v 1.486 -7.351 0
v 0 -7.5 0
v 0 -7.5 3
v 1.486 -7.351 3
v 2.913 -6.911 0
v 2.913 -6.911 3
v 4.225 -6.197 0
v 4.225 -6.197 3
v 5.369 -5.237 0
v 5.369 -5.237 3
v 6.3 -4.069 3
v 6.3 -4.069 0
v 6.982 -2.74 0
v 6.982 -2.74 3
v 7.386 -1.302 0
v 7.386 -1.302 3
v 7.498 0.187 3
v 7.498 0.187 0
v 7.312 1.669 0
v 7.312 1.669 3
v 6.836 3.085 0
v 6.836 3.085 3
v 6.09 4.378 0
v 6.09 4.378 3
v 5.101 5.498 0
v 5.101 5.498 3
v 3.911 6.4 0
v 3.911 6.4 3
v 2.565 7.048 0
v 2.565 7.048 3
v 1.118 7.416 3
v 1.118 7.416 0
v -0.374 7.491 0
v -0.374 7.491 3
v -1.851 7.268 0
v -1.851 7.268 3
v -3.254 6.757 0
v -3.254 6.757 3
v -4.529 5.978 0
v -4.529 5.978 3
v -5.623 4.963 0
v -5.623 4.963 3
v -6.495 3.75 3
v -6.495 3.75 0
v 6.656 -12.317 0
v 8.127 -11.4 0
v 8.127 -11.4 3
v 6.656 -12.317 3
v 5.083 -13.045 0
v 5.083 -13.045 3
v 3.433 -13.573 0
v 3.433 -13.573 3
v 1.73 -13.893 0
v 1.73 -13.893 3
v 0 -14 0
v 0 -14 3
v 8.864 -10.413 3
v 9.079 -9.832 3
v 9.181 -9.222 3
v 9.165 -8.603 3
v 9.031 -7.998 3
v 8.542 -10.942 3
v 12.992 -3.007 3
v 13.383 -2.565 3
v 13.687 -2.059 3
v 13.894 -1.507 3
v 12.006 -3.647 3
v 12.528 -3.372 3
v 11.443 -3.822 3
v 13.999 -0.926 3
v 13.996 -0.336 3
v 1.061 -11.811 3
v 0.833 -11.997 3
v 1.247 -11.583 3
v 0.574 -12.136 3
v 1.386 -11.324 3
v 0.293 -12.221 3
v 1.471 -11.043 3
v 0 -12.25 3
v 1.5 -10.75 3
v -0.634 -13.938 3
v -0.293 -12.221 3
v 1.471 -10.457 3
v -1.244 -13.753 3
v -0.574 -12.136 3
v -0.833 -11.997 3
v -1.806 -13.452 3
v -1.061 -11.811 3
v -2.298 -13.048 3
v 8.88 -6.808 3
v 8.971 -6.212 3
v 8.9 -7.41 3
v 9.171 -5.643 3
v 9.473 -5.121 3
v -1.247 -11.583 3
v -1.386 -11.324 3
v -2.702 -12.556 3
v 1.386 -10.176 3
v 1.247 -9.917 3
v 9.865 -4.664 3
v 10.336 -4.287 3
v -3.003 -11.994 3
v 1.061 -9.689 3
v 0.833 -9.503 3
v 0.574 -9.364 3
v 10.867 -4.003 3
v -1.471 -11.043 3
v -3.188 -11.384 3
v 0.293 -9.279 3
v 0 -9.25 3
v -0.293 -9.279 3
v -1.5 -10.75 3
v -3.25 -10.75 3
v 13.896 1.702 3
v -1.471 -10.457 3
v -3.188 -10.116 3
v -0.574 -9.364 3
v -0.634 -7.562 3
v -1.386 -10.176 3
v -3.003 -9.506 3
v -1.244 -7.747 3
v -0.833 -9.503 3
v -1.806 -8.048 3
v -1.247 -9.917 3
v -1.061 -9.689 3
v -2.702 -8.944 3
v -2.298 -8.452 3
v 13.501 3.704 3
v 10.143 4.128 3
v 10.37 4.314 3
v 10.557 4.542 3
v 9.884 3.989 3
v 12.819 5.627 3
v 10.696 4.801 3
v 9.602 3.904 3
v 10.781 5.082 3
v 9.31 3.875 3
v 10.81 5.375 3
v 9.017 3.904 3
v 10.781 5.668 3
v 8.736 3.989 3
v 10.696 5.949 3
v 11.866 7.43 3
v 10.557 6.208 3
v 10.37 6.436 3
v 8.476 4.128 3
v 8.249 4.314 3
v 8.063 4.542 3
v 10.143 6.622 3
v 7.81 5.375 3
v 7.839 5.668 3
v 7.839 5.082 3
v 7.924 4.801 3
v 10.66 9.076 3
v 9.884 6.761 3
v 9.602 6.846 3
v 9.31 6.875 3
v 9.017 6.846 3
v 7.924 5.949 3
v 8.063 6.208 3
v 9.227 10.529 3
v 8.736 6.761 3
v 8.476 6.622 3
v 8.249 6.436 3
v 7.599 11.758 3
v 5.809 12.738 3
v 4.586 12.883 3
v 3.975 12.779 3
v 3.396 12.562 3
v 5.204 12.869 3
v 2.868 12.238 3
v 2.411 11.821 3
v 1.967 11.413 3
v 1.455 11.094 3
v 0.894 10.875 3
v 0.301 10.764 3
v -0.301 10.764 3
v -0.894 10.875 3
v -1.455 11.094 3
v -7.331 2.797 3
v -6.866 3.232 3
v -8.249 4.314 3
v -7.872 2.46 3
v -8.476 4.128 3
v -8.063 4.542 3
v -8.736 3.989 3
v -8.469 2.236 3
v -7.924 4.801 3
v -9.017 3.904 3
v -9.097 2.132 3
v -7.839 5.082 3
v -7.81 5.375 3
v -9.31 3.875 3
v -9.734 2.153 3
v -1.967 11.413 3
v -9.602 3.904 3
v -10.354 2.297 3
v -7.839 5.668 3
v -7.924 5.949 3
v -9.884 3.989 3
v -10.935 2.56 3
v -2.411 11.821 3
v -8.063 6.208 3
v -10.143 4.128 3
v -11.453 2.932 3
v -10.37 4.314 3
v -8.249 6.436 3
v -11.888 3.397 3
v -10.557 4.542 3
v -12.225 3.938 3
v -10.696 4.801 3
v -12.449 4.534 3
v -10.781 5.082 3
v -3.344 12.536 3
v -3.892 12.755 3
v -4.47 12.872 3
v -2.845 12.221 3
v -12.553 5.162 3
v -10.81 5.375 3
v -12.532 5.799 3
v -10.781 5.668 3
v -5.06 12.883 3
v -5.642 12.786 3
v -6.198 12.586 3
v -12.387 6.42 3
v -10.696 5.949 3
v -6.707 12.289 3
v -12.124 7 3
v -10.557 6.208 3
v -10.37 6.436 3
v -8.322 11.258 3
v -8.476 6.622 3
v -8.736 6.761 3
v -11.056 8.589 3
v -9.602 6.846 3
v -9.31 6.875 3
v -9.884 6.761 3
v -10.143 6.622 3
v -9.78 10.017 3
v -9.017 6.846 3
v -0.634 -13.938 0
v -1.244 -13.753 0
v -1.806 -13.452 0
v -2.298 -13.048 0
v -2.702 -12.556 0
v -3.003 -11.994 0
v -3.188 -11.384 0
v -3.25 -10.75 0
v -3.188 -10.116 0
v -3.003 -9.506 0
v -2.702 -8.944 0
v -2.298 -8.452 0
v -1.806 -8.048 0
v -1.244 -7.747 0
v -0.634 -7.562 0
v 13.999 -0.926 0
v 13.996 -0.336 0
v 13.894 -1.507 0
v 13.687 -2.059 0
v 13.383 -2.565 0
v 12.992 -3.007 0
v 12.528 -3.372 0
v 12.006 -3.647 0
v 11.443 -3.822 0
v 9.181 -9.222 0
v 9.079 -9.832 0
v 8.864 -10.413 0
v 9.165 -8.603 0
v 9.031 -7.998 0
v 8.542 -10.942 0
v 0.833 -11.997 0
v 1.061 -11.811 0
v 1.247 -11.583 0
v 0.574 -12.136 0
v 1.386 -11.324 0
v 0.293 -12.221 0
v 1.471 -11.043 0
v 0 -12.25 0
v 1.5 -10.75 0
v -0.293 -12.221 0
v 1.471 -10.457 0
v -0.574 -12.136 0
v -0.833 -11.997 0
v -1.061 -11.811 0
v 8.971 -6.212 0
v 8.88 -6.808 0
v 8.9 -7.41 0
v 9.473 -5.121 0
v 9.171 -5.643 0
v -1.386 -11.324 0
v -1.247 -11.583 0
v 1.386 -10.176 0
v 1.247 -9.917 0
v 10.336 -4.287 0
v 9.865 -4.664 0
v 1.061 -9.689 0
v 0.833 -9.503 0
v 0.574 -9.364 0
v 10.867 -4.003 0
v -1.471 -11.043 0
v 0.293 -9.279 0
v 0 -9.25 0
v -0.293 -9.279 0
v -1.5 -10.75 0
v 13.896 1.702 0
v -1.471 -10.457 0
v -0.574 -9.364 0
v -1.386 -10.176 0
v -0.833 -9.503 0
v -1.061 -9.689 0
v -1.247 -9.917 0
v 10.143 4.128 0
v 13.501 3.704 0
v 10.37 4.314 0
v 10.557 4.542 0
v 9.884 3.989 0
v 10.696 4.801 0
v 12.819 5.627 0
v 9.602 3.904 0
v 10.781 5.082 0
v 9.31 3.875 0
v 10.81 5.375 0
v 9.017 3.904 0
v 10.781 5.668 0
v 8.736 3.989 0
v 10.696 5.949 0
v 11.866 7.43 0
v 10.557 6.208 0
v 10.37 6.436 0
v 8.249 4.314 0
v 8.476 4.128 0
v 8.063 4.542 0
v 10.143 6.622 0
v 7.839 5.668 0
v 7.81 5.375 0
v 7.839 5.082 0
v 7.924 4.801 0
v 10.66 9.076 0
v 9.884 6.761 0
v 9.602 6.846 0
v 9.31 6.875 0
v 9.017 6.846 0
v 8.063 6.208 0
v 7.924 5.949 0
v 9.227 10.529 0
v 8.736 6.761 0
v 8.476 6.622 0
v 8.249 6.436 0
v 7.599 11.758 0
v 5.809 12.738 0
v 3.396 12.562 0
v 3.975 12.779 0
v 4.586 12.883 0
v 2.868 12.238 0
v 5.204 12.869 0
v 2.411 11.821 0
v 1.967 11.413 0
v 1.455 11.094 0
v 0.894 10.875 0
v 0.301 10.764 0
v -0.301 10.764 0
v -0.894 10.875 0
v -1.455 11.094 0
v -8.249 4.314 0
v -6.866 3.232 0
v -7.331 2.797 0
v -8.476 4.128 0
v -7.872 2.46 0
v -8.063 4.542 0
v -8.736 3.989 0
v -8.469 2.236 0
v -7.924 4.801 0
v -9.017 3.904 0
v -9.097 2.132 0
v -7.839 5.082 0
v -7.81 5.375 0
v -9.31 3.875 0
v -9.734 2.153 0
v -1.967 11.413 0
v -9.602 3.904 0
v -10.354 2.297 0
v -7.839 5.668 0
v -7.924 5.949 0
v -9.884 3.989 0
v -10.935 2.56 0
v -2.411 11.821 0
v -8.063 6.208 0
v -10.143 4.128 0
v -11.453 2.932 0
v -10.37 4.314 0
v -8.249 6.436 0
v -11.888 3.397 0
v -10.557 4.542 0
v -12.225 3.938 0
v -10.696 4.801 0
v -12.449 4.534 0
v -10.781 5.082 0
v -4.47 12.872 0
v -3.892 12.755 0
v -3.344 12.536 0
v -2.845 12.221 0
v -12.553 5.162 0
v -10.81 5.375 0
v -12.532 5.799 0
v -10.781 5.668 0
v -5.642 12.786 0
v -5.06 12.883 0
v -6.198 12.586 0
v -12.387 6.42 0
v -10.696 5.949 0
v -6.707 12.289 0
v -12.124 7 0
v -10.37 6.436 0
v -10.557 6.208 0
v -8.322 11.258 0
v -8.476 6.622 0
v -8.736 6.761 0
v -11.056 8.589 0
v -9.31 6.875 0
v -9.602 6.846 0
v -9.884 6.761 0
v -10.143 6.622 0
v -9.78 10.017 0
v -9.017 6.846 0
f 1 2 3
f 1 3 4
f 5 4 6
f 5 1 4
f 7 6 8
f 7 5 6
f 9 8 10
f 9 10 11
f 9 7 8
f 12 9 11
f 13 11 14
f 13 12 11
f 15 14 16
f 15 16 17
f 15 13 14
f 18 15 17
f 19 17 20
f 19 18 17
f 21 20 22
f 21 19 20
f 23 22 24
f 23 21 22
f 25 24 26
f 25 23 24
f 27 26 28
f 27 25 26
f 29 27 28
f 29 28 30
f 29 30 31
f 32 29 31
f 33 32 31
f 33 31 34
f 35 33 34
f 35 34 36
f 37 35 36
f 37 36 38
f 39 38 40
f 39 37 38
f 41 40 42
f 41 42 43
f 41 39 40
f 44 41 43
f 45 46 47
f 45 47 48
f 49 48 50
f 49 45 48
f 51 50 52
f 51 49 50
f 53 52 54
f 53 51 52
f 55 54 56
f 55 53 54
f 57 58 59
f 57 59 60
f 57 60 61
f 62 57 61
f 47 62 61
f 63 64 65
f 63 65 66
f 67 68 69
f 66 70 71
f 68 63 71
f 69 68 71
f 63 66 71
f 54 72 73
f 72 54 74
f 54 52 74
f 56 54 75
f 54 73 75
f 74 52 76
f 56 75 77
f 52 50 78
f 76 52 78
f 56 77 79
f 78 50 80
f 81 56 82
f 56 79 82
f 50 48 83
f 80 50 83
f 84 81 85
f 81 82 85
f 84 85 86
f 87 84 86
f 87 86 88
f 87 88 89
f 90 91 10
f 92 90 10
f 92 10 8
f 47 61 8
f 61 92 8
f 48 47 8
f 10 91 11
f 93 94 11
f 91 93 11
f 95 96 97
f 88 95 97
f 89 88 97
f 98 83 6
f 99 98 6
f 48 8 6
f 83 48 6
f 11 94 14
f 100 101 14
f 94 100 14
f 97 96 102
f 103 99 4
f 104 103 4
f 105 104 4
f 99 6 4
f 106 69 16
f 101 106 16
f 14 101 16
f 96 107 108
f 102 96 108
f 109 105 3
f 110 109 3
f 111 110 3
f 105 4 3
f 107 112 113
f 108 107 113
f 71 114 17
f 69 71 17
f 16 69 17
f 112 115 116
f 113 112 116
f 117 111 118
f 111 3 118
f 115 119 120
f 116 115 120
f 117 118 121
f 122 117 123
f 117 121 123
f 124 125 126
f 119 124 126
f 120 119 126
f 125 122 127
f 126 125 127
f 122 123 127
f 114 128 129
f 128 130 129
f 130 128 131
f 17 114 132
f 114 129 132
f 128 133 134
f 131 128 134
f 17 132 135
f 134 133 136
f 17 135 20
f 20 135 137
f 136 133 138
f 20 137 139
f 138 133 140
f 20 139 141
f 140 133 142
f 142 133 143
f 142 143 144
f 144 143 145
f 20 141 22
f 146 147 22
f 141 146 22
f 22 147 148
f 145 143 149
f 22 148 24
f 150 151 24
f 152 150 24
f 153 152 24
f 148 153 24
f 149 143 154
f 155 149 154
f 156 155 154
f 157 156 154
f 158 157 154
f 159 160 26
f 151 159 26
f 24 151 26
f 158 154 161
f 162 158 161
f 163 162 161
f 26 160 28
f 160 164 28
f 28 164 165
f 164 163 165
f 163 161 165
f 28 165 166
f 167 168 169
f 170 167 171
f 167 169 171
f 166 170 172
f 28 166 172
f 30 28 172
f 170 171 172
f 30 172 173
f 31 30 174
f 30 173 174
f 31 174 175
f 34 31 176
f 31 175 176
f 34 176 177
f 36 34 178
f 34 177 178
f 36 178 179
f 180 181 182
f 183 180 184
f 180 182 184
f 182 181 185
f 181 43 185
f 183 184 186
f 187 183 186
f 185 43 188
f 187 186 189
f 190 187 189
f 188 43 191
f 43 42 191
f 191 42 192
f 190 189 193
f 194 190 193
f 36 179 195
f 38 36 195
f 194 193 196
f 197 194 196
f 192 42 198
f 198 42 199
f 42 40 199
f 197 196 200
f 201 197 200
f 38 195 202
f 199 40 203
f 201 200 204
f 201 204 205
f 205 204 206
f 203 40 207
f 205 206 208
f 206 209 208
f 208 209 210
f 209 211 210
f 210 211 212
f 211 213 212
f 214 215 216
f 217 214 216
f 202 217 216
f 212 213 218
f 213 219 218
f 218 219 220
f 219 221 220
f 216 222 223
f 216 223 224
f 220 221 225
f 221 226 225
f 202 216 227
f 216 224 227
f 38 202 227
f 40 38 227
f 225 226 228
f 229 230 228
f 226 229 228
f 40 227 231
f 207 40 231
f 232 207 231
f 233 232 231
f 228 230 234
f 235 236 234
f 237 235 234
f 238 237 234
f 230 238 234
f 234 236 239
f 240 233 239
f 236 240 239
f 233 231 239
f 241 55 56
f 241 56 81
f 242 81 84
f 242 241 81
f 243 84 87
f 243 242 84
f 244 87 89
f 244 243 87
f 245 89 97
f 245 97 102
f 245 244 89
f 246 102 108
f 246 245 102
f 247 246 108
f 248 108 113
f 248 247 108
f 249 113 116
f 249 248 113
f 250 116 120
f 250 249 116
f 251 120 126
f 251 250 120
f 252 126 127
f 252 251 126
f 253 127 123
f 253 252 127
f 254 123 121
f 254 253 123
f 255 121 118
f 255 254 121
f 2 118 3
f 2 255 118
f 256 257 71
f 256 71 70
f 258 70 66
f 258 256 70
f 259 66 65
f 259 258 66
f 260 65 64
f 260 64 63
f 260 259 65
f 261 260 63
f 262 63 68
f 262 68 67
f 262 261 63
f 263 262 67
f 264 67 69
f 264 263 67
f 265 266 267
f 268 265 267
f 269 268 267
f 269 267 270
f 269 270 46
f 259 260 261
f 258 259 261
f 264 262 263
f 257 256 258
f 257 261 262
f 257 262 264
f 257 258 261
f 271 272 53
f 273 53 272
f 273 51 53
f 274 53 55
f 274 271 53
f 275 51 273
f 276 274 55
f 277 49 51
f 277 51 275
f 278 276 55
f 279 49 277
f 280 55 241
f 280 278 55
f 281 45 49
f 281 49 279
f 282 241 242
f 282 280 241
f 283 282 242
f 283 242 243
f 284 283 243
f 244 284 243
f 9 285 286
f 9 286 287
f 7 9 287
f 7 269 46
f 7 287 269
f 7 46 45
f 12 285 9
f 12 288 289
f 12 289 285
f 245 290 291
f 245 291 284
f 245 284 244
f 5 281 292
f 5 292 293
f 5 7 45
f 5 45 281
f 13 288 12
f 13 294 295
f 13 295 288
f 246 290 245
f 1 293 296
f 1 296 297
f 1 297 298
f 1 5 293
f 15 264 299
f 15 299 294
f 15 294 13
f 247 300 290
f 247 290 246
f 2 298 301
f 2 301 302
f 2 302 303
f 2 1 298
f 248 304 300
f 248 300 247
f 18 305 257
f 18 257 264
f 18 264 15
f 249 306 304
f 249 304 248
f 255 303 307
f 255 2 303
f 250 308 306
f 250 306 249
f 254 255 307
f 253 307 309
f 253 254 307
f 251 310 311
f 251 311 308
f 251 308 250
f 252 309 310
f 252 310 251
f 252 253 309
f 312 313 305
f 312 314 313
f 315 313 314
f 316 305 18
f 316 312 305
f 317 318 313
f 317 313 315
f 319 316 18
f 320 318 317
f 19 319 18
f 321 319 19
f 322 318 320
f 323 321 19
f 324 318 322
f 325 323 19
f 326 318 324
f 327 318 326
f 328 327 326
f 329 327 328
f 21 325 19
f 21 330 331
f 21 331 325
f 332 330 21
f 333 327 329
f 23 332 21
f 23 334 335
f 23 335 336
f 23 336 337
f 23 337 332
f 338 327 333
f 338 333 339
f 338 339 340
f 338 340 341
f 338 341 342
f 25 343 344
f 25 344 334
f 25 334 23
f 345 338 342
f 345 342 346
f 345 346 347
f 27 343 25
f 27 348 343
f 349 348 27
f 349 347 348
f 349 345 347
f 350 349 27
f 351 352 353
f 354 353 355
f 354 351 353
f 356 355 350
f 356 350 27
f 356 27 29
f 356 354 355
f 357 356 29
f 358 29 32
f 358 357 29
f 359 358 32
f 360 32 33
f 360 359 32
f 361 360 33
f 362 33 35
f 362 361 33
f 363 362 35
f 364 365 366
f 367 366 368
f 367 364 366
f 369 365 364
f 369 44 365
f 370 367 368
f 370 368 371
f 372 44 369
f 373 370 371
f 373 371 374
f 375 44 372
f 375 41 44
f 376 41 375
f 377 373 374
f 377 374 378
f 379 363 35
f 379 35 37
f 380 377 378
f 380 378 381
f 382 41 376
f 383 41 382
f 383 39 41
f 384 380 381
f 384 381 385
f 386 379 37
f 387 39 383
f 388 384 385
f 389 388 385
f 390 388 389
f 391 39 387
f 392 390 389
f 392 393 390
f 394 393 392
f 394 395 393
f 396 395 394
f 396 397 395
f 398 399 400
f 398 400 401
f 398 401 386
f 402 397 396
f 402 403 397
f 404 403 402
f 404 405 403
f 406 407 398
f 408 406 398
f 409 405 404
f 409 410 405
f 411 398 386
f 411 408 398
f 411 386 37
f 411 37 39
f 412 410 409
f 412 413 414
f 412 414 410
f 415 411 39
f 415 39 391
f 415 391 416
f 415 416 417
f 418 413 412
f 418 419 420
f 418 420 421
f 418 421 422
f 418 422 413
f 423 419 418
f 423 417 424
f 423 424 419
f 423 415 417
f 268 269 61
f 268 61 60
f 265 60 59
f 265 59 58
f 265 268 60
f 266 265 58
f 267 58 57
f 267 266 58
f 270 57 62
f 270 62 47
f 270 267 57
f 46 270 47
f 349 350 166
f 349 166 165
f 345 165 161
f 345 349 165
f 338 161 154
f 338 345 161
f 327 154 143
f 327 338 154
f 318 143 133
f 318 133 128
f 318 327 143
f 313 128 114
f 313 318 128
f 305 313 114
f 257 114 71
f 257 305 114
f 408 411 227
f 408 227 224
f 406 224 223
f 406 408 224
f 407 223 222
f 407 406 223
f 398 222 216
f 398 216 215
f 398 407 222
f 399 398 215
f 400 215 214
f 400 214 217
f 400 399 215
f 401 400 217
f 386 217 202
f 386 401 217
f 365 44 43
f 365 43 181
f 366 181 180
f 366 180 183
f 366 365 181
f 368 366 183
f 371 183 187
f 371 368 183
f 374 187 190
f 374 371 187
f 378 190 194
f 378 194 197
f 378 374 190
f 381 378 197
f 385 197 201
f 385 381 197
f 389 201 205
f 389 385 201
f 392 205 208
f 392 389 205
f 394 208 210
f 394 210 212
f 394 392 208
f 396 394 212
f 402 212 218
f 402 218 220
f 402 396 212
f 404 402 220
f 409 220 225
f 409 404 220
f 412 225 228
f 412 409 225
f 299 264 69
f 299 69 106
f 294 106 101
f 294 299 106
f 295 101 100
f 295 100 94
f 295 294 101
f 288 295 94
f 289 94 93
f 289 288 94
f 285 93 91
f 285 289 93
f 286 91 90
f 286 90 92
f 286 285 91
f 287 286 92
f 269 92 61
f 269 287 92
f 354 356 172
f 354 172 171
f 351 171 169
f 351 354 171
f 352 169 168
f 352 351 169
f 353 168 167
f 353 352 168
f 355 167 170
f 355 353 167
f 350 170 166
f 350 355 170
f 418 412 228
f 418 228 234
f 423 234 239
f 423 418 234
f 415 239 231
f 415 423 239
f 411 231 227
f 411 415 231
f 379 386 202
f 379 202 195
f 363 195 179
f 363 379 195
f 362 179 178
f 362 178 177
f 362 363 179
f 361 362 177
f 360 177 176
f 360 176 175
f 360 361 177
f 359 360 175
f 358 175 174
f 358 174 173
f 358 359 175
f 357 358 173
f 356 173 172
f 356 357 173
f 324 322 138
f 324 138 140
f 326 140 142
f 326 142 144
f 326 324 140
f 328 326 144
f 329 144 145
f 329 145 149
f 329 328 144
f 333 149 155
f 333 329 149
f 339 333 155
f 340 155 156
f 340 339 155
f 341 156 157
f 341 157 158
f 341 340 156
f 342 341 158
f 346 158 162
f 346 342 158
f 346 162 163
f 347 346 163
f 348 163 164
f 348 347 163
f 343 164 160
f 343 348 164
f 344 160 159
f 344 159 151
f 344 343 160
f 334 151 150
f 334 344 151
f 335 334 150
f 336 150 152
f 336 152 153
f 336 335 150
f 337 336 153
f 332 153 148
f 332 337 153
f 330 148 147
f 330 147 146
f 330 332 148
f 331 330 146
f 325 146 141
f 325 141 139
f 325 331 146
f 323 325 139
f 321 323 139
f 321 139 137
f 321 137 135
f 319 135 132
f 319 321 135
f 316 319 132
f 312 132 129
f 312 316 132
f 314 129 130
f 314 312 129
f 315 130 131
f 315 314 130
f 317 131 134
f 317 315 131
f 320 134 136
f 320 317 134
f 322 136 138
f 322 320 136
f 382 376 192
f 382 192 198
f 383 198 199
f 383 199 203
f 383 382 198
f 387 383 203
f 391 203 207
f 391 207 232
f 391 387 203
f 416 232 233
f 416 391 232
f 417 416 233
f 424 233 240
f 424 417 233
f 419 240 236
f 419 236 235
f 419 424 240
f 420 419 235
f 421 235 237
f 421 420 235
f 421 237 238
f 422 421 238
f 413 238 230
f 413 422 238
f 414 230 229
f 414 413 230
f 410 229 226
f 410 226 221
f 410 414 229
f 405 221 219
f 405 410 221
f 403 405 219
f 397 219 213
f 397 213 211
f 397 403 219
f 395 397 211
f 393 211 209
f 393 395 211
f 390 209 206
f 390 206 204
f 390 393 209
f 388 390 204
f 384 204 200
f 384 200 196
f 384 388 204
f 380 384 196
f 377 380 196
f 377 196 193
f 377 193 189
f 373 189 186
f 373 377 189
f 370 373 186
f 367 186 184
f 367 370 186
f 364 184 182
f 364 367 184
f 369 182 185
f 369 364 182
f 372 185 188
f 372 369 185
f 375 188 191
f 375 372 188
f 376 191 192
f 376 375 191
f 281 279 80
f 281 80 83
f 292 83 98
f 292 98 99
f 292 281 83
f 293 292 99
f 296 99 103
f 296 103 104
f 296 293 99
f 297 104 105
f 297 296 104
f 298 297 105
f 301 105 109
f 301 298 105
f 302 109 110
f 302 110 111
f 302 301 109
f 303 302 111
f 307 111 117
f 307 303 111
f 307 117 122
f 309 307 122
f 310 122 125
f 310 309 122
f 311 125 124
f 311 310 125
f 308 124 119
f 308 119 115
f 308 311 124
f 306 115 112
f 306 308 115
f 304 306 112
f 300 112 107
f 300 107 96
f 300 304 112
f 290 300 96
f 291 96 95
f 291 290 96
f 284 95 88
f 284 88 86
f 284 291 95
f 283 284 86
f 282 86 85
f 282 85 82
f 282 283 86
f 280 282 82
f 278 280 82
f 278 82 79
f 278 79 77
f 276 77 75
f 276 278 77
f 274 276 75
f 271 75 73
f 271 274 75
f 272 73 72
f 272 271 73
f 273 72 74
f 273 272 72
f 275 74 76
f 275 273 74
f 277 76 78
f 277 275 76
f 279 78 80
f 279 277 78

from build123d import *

# Parameters (mm, degrees)
ESQUISSE1_R        = 1.5
BOSS_EXTRU_2_DEPTH = 3


with BuildPart() as part:
    # Esquisse1 → Boss.-Extru.2 (new body)
    with BuildSketch(Plane.XY):
        with BuildLine():
            ThreePointArc((-2.411034891, 11.820685714), (0, 10.75), (2.411034891, 11.820685714))
            ThreePointArc((2.411034891, 11.820685714), (3.975330286, 12.779130538), (5.80943088, 12.737759334))
            ThreePointArc((5.80943088, 12.737759334), (11.865562564, 7.430237213), (13.995977593, -0.335575935))
            ThreePointArc((13.995977593, -0.335575935), (13.382779595, -2.564868949), (11.442531564, -3.822325392))
            ThreePointArc((11.442531564, -3.822325392), (9.309773091, -5.375), (9.031496673, -7.998360322))
            ThreePointArc((9.031496673, -7.998360322), (9.079386541, -9.832302285), (8.126507731, -11.399994391))
            ThreePointArc((8.126507731, -11.399994391), (4.266150404, -13.334165168), (0, -14))
            ThreePointArc((0, -14), (-3.25, -10.75), (0, -7.5))
            ThreePointArc((0, -7.5), (6.495190528, 3.75), (-6.495190528, 3.75))
            ThreePointArc((-6.495190528, 3.75), (-10.934773091, 2.560417438), (-12.124355653, 7))
            ThreePointArc((-12.124355653, 7), (-9.780131311, 10.017436376), (-6.707371512, 12.288660114))
            ThreePointArc((-6.707371512, 12.288660114), (-4.47014813, 12.872261577), (-2.411034891, 11.820685714))
        make_face()
        with Locations((9.309773091, 5.375)):
            Circle(ESQUISSE1_R, mode=Mode.SUBTRACT)
        with Locations((0, -10.75)):
            Circle(ESQUISSE1_R, mode=Mode.SUBTRACT)
        with Locations((-9.309773091, 5.375)):
            Circle(ESQUISSE1_R, mode=Mode.SUBTRACT)
    extrude(amount=BOSS_EXTRU_2_DEPTH)


solid = part.part
